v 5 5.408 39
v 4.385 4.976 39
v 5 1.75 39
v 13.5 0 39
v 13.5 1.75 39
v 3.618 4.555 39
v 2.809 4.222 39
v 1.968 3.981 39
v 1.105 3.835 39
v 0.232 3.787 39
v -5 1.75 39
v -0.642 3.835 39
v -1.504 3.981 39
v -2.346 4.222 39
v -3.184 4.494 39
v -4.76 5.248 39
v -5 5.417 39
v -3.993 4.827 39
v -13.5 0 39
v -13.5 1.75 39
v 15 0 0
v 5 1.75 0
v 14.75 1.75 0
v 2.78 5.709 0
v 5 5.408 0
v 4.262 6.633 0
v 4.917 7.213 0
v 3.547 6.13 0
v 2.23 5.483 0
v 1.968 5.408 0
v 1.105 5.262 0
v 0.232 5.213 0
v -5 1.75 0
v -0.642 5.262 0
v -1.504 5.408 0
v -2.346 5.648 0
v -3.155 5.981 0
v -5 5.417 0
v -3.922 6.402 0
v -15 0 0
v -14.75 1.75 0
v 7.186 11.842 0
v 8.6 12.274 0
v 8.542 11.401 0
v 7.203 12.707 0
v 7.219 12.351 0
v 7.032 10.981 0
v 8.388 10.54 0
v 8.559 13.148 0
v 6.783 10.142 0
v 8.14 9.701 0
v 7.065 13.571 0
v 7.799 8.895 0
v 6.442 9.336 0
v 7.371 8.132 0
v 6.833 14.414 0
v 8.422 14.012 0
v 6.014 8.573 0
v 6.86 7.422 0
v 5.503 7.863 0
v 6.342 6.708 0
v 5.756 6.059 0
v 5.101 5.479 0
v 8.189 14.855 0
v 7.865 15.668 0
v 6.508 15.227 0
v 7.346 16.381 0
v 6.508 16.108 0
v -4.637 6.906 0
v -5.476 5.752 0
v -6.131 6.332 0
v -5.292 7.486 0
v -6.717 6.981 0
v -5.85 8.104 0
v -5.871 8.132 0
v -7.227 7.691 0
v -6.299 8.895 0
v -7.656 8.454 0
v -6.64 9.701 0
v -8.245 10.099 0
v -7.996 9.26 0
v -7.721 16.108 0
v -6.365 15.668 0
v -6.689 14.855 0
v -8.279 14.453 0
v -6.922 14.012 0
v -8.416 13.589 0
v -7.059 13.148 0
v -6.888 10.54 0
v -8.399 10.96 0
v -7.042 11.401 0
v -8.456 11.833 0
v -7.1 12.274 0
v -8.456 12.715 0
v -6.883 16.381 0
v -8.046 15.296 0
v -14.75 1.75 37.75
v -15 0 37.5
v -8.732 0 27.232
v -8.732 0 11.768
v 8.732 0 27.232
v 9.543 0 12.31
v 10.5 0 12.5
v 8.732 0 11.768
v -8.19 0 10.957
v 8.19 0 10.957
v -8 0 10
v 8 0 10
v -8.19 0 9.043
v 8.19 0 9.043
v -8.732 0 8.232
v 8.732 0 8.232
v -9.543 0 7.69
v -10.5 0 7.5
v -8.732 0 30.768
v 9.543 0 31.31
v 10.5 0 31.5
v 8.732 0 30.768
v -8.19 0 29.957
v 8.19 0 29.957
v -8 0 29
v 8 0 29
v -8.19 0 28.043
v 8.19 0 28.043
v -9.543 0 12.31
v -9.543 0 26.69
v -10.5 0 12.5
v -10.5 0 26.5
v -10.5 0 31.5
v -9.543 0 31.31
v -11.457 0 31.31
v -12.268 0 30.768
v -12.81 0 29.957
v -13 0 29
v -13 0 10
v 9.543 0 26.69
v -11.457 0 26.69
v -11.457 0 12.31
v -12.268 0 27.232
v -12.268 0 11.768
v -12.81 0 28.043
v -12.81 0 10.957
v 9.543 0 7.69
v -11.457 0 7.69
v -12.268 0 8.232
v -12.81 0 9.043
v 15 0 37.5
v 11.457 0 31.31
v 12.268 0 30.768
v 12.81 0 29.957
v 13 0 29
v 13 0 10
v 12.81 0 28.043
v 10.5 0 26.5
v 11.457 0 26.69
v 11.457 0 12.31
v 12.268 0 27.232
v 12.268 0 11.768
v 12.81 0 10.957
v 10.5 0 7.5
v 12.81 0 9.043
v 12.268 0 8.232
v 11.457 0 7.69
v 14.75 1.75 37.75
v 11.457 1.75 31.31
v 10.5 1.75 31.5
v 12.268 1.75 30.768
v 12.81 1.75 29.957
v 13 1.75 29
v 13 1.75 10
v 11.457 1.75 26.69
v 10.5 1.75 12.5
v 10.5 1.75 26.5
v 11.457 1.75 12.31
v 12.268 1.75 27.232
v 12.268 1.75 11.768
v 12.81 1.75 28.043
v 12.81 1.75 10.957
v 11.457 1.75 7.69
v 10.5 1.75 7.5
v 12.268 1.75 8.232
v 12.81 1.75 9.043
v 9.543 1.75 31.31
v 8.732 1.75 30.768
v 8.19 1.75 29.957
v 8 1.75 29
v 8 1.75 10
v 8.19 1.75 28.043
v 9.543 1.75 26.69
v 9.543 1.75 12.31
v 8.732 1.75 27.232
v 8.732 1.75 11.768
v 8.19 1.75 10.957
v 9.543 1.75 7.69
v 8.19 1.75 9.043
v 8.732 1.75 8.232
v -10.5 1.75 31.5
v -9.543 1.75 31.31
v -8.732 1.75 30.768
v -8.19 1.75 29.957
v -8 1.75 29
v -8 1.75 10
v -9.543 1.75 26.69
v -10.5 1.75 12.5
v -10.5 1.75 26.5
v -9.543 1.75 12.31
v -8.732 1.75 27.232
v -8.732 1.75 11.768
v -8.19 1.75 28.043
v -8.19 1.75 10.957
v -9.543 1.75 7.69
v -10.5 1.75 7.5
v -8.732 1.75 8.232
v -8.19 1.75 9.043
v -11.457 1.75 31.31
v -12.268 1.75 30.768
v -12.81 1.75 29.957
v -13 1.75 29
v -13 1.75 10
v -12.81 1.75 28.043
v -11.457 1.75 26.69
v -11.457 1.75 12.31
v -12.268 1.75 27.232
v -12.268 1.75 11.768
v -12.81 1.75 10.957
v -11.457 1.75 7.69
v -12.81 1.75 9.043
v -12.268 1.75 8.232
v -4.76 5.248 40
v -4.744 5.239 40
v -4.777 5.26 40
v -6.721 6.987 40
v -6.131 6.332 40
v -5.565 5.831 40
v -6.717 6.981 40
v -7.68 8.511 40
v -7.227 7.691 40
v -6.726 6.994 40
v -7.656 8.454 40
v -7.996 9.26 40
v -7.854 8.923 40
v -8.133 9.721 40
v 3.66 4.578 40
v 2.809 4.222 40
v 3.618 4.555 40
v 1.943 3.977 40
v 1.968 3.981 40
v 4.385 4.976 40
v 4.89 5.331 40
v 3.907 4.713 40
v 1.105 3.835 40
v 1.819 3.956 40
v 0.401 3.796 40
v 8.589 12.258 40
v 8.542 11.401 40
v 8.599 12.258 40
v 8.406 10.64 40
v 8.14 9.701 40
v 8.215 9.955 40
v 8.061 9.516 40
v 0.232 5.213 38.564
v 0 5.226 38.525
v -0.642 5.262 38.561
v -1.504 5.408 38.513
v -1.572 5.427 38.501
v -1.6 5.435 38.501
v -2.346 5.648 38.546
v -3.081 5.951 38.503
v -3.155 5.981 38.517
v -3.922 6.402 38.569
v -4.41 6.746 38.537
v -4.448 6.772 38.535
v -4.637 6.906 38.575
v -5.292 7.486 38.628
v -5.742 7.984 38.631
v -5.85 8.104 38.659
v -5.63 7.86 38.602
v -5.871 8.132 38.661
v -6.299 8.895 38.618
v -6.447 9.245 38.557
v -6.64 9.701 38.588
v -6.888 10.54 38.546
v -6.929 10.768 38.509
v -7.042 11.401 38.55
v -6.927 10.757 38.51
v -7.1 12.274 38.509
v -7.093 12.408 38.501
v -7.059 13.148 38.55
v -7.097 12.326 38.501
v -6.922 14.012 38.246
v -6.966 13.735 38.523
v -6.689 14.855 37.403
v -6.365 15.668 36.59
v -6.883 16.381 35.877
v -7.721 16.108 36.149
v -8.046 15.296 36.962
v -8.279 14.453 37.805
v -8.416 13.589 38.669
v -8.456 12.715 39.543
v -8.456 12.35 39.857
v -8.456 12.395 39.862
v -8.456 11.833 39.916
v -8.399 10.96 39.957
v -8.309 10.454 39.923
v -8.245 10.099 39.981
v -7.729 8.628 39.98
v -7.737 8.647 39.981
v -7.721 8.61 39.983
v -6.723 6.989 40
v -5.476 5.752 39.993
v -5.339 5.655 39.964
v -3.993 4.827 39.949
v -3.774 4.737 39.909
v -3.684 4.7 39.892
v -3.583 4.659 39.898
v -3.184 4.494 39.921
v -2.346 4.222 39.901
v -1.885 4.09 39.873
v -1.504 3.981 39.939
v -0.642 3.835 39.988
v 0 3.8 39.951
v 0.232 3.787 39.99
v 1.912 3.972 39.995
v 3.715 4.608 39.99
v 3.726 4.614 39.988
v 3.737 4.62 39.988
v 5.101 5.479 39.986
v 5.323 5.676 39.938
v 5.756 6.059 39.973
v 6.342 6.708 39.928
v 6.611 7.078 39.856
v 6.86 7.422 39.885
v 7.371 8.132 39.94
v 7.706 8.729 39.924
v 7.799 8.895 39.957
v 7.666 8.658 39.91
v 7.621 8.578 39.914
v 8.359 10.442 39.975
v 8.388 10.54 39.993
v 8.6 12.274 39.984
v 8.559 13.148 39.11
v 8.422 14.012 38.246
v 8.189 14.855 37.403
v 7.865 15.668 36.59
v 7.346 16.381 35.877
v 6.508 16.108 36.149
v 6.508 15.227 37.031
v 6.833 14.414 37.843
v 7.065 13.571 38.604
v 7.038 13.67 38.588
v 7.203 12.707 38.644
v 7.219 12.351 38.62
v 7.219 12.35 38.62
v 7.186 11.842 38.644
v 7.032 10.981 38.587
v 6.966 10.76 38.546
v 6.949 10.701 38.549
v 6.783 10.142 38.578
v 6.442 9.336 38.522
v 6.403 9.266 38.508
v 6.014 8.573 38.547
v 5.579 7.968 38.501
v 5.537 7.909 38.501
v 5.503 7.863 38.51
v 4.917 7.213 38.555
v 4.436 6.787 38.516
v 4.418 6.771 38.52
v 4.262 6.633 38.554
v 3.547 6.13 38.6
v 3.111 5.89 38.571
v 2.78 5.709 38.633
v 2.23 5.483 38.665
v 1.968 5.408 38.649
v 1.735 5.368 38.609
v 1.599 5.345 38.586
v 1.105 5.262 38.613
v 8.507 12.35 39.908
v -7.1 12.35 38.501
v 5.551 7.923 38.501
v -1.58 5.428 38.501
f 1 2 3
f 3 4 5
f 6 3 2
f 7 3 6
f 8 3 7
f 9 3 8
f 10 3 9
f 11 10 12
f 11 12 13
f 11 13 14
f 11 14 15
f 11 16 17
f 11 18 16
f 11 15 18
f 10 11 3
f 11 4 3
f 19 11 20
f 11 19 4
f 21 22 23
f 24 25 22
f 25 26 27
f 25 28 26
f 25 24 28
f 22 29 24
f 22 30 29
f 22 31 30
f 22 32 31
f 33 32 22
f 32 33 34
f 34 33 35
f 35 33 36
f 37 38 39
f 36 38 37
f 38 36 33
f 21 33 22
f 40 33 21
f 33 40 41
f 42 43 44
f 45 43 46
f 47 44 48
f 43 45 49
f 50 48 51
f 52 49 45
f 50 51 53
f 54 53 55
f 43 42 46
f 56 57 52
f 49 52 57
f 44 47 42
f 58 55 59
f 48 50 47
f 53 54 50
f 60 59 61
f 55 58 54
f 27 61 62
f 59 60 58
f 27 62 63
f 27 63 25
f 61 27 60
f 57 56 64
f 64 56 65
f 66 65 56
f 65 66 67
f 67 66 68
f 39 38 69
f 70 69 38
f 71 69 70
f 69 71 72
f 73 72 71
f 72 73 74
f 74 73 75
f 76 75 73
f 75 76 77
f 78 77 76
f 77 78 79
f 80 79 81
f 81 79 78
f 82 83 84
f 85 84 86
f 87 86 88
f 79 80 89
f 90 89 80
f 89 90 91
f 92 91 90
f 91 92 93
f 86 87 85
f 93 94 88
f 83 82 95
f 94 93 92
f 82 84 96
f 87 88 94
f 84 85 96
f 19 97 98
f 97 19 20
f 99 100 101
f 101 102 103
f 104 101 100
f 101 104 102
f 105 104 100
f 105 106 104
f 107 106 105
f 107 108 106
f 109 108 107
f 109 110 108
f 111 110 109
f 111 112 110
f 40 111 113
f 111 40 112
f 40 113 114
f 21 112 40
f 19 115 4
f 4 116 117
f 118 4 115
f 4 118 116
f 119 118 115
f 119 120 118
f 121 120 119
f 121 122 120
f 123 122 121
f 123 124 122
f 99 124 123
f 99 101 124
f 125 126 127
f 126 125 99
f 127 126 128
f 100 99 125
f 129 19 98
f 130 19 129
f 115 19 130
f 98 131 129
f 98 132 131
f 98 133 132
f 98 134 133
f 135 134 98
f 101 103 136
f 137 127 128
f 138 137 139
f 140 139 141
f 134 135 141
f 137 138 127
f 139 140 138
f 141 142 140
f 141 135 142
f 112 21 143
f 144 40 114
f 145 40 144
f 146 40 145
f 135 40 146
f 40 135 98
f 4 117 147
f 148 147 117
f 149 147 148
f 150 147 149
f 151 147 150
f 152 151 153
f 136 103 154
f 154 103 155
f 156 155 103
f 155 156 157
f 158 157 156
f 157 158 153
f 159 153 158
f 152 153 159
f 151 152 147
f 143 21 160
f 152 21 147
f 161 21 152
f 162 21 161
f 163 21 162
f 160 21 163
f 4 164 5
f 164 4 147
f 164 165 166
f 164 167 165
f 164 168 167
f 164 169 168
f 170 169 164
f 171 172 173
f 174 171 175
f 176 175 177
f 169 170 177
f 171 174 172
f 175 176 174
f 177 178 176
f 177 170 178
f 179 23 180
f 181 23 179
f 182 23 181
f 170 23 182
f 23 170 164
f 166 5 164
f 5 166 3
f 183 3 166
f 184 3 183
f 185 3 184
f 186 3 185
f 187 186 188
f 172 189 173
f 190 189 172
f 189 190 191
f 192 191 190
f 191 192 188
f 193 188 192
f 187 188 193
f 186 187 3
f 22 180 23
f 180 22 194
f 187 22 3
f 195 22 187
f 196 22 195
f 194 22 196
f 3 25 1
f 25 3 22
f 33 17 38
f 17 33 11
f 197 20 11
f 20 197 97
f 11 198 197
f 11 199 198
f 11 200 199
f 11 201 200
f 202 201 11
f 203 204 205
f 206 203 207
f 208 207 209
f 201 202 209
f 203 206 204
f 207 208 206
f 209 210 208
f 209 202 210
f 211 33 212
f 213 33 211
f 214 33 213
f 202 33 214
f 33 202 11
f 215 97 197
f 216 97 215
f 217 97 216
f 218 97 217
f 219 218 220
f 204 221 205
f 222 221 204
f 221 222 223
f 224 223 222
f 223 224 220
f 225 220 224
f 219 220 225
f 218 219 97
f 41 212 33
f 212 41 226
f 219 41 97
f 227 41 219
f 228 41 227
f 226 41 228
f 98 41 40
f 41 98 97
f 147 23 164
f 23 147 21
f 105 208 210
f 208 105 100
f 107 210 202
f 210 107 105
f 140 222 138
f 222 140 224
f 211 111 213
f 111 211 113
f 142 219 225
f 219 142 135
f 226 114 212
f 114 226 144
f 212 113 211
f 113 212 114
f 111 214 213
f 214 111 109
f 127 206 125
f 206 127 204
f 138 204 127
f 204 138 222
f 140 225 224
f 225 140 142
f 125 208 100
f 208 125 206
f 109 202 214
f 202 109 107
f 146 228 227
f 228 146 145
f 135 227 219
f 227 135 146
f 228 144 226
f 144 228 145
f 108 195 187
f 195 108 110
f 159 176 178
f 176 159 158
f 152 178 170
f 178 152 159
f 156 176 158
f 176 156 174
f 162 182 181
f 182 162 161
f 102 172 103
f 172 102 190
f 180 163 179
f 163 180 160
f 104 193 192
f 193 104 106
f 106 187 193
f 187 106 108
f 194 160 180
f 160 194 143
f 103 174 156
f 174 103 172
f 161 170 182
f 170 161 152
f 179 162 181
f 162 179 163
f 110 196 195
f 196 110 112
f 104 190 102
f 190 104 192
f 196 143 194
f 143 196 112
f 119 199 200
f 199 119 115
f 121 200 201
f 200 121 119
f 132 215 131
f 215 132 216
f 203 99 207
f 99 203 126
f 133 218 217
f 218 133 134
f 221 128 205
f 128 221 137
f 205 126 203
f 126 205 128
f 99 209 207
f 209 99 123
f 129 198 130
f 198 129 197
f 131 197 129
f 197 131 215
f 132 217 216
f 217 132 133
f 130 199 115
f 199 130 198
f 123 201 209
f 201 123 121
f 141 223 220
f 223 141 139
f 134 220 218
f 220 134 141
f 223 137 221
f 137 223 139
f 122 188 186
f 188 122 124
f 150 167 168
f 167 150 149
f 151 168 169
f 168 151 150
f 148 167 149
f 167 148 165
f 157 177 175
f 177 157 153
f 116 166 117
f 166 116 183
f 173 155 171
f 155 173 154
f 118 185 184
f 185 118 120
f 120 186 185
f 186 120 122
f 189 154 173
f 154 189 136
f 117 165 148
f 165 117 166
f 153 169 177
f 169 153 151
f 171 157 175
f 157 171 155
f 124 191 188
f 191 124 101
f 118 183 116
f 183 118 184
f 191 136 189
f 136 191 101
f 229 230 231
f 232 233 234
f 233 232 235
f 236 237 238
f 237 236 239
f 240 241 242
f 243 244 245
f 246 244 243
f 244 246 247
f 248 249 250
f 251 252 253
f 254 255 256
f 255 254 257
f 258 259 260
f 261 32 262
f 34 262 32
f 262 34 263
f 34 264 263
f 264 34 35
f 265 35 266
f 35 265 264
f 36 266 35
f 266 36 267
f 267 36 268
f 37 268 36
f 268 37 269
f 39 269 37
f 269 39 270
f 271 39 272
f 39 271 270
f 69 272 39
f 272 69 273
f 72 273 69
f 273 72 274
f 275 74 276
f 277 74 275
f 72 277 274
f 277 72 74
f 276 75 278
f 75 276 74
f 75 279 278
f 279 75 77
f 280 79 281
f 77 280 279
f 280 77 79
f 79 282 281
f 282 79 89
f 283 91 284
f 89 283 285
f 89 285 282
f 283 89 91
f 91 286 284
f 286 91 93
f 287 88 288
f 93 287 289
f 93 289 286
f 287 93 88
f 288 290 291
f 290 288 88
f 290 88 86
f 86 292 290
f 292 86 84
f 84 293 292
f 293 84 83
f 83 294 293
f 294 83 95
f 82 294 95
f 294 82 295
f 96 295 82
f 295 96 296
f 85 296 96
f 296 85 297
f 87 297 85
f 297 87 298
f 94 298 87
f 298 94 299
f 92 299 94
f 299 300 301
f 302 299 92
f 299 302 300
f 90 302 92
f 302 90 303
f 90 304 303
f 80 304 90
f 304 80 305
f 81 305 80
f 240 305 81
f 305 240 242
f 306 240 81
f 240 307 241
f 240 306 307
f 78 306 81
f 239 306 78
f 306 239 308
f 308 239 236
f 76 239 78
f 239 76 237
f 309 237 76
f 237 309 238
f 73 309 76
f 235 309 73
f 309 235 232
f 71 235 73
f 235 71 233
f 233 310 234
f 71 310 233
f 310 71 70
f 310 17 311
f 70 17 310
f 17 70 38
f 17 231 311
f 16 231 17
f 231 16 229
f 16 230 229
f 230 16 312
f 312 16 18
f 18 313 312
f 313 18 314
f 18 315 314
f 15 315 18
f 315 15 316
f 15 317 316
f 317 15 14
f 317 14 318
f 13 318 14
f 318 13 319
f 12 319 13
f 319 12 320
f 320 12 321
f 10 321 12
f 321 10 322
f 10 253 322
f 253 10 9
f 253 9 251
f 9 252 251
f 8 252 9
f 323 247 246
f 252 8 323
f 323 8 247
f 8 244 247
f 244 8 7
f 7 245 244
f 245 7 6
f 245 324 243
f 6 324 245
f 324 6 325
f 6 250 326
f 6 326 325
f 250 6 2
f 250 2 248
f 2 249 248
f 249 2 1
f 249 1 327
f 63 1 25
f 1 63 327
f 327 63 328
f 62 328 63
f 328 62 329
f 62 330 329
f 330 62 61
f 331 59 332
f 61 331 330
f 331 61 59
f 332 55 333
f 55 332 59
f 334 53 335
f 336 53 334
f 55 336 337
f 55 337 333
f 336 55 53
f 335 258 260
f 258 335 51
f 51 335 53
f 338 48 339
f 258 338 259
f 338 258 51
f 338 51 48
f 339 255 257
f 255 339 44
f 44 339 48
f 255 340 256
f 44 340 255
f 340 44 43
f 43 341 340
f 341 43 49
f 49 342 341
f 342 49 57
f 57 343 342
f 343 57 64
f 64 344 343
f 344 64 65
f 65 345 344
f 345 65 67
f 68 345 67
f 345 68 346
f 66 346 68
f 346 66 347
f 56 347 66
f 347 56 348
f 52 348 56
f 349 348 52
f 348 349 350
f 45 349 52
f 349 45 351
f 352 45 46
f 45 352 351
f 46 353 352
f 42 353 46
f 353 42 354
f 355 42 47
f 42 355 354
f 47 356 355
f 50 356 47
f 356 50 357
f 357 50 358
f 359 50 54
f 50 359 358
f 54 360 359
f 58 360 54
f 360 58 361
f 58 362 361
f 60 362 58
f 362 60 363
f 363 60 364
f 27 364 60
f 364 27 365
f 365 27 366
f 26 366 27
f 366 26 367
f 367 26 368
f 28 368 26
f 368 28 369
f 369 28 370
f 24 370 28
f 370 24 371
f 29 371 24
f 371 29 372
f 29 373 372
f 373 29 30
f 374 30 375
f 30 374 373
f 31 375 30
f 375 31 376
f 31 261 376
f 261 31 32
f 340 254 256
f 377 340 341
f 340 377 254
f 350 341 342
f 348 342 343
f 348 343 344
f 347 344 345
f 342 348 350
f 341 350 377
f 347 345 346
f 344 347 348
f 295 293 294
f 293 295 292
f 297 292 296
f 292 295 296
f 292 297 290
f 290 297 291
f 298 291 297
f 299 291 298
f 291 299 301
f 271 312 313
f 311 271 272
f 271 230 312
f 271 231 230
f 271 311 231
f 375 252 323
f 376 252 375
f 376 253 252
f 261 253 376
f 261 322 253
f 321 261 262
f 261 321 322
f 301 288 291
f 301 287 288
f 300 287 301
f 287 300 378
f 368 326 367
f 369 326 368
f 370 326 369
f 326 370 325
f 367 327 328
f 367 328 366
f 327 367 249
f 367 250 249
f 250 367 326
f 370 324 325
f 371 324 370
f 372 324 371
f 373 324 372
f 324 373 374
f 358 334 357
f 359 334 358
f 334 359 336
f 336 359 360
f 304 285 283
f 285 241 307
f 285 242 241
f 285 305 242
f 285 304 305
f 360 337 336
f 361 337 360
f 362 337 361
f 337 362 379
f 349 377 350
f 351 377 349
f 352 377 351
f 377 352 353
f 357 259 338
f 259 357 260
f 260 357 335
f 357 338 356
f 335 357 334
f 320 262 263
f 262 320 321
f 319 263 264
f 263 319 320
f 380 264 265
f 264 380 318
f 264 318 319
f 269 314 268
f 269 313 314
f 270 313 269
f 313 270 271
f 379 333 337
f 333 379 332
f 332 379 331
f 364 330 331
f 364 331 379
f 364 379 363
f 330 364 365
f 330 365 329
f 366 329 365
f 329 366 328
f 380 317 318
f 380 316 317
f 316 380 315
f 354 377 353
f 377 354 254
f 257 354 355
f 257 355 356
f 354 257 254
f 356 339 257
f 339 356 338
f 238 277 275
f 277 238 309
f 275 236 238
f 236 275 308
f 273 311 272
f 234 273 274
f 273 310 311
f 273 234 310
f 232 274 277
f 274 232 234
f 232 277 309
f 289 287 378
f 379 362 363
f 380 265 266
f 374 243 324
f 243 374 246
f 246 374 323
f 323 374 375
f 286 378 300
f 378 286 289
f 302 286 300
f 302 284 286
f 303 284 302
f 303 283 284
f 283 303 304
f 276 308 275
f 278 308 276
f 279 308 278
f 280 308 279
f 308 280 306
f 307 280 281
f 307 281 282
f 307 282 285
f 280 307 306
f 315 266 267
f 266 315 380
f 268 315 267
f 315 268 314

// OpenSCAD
   
mountOffset = 2;
clipLength = 40; 
clipWallThickness = 1.5;
clipOpeningAngle = 130;
laserDiameter = 14;
clipTolerance = 0.1;
mountLength = 39;
mountInset = 10;
mountTaper = 0.25;
mountCorner = 1.5;   
mountWidth = 30;
mountThickness = 1.75;
screwHole = 5;
screwOffset = 2;
mountWidthTolerance = 0.4;
mountThicknessTolerance = 0.3;


module dummy() {}

laserDiameter1 = laserDiameter+clipTolerance*2;
nudge = 0.001;    

module holes() {
    x = mountWidth/2-screwOffset-screwHole/2;
for (h=[[-x,2*screwHole],[x,2*screwHole],[-x,mountLength-2*screwHole],[x,mountLength-2*screwHole]]) translate([h[0],mountThickness,h[1]]) rotate([90,0,0]) cylinder(d=screwHole, h=mountThickness*3, $fn=16);  
    }

module mount(coverStickout = 2) {    
mountProfile = [
    [-mountWidth/2, 0],
    [-mountWidth/2+mountTaper, mountThickness],
    [-mountWidth/2+mountInset, mountThickness],
    [-mountWidth/2+mountInset, mountThickness+coverStickout],
    [mountWidth/2-mountInset, mountThickness+coverStickout],
    [mountWidth/2-mountInset, mountThickness],
    [mountWidth/2-mountTaper, mountThickness],
    [mountWidth/2, 0] ];
    
    render(convexity=1)
    intersection() {
        rotate([0,0,180])
        rotate([90,0,0])
        linear_extrude(height=mountThickness+coverStickout)
        polygon([[-mountWidth/2,0],
            [-mountWidth/2,mountLength-mountCorner],
            [-mountWidth/2+mountCorner,mountLength],
            [mountWidth/2-mountCorner,mountLength],
            [mountWidth/2,mountLength-mountCorner],
            [mountWidth/2,0]]);
        linear_extrude(height=mountLength) 
            polygon(mountProfile);
    }

}

module spiralArc(startAngle=0, endAngle=360, startRadius=10, endRadius=10, thickness=5, precision=36) {
    for (i=[0:precision-1]) {
        t1=i/precision;
        t2=(i+1)/precision;
        angle1 = (1-t1)*startAngle + t1*endAngle;
        angle2 = (1-t2)*startAngle + t2*endAngle;
        r1 = thickness/2+(1-t1)*startRadius + t1*endRadius;
        r2 = thickness/2+(1-t2)*startRadius + t2*endRadius;
        hull() {
            translate(r1*[cos(angle1),sin(angle1)]) circle(d=thickness);
            translate(r2*[cos(angle2),sin(angle2)]) circle(d=thickness);
        }
    }
}

module clip() {
        translate([0,laserDiameter1/2+clipWallThickness,0]) 
        
        difference() {
            linear_extrude(height=clipLength) 
                spiralArc(startRadius=laserDiameter1/2,endRadius=laserDiameter1/2,thickness=clipWallThickness,startAngle=90+clipOpeningAngle/2,endAngle=360+90-clipOpeningAngle/2);
            translate([0,laserDiameter1*.85,clipLength]) rotate([-45,0,0])
            cube(center=true,laserDiameter1+2*clipWallThickness);
    translate([0,0,clipLength-clipWallThickness+nudge]) cylinder(h=clipWallThickness,d1=laserDiameter1,d2=laserDiameter1+2*clipWallThickness);
       
        }
        /*
        translate([0,laserDiameter1/2+clipWallThickness,0]) 
            linear_extrude(height=clipLength/2) {
            spiralArc(startRadius=laserDiameter1/2,endRadius=laserDiameter1/2+clipWallThickness/2,thickness=clipWallThickness,startAngle=90-clipOpeningAngle/2-laserButtonPresserArcAngle/2,endAngle=90-clipOpeningAngle/2);
            spiralArc(startRadius=laserDiameter1/2+clipWallThickness/2,endRadius=laserDiameter1/2+laserButtonStickout,thickness=clipWallThickness,startAngle=90-clipOpeningAngle/2,endAngle=90-clipOpeningAngle/2+laserButtonPresserArcAngle/2);
            spiralArc(startRadius=laserDiameter1/2+laserButtonStickout,endRadius=laserDiameter1/2+laserButtonStickout,thickness=clipWallThickness,startAngle=90-clipOpeningAngle/2+laserButtonPresserArcAngle/2,endAngle=90-clipOpeningAngle/2+laserButtonPresserArcAngle);
            }
            */
}

render(convexity=3)
difference() {
    mount(coverStickout = laserDiameter1/2+mountOffset);
    holes();
    #translate([0,mountOffset+mountThickness+laserDiameter1/2+clipWallThickness,0])
    translate([0,0,-nudge]) 
        cylinder(h=clipLength+2*nudge,d=laserDiameter1+clipWallThickness);
}

translate([0,mountThickness+mountOffset,0])
clip();
